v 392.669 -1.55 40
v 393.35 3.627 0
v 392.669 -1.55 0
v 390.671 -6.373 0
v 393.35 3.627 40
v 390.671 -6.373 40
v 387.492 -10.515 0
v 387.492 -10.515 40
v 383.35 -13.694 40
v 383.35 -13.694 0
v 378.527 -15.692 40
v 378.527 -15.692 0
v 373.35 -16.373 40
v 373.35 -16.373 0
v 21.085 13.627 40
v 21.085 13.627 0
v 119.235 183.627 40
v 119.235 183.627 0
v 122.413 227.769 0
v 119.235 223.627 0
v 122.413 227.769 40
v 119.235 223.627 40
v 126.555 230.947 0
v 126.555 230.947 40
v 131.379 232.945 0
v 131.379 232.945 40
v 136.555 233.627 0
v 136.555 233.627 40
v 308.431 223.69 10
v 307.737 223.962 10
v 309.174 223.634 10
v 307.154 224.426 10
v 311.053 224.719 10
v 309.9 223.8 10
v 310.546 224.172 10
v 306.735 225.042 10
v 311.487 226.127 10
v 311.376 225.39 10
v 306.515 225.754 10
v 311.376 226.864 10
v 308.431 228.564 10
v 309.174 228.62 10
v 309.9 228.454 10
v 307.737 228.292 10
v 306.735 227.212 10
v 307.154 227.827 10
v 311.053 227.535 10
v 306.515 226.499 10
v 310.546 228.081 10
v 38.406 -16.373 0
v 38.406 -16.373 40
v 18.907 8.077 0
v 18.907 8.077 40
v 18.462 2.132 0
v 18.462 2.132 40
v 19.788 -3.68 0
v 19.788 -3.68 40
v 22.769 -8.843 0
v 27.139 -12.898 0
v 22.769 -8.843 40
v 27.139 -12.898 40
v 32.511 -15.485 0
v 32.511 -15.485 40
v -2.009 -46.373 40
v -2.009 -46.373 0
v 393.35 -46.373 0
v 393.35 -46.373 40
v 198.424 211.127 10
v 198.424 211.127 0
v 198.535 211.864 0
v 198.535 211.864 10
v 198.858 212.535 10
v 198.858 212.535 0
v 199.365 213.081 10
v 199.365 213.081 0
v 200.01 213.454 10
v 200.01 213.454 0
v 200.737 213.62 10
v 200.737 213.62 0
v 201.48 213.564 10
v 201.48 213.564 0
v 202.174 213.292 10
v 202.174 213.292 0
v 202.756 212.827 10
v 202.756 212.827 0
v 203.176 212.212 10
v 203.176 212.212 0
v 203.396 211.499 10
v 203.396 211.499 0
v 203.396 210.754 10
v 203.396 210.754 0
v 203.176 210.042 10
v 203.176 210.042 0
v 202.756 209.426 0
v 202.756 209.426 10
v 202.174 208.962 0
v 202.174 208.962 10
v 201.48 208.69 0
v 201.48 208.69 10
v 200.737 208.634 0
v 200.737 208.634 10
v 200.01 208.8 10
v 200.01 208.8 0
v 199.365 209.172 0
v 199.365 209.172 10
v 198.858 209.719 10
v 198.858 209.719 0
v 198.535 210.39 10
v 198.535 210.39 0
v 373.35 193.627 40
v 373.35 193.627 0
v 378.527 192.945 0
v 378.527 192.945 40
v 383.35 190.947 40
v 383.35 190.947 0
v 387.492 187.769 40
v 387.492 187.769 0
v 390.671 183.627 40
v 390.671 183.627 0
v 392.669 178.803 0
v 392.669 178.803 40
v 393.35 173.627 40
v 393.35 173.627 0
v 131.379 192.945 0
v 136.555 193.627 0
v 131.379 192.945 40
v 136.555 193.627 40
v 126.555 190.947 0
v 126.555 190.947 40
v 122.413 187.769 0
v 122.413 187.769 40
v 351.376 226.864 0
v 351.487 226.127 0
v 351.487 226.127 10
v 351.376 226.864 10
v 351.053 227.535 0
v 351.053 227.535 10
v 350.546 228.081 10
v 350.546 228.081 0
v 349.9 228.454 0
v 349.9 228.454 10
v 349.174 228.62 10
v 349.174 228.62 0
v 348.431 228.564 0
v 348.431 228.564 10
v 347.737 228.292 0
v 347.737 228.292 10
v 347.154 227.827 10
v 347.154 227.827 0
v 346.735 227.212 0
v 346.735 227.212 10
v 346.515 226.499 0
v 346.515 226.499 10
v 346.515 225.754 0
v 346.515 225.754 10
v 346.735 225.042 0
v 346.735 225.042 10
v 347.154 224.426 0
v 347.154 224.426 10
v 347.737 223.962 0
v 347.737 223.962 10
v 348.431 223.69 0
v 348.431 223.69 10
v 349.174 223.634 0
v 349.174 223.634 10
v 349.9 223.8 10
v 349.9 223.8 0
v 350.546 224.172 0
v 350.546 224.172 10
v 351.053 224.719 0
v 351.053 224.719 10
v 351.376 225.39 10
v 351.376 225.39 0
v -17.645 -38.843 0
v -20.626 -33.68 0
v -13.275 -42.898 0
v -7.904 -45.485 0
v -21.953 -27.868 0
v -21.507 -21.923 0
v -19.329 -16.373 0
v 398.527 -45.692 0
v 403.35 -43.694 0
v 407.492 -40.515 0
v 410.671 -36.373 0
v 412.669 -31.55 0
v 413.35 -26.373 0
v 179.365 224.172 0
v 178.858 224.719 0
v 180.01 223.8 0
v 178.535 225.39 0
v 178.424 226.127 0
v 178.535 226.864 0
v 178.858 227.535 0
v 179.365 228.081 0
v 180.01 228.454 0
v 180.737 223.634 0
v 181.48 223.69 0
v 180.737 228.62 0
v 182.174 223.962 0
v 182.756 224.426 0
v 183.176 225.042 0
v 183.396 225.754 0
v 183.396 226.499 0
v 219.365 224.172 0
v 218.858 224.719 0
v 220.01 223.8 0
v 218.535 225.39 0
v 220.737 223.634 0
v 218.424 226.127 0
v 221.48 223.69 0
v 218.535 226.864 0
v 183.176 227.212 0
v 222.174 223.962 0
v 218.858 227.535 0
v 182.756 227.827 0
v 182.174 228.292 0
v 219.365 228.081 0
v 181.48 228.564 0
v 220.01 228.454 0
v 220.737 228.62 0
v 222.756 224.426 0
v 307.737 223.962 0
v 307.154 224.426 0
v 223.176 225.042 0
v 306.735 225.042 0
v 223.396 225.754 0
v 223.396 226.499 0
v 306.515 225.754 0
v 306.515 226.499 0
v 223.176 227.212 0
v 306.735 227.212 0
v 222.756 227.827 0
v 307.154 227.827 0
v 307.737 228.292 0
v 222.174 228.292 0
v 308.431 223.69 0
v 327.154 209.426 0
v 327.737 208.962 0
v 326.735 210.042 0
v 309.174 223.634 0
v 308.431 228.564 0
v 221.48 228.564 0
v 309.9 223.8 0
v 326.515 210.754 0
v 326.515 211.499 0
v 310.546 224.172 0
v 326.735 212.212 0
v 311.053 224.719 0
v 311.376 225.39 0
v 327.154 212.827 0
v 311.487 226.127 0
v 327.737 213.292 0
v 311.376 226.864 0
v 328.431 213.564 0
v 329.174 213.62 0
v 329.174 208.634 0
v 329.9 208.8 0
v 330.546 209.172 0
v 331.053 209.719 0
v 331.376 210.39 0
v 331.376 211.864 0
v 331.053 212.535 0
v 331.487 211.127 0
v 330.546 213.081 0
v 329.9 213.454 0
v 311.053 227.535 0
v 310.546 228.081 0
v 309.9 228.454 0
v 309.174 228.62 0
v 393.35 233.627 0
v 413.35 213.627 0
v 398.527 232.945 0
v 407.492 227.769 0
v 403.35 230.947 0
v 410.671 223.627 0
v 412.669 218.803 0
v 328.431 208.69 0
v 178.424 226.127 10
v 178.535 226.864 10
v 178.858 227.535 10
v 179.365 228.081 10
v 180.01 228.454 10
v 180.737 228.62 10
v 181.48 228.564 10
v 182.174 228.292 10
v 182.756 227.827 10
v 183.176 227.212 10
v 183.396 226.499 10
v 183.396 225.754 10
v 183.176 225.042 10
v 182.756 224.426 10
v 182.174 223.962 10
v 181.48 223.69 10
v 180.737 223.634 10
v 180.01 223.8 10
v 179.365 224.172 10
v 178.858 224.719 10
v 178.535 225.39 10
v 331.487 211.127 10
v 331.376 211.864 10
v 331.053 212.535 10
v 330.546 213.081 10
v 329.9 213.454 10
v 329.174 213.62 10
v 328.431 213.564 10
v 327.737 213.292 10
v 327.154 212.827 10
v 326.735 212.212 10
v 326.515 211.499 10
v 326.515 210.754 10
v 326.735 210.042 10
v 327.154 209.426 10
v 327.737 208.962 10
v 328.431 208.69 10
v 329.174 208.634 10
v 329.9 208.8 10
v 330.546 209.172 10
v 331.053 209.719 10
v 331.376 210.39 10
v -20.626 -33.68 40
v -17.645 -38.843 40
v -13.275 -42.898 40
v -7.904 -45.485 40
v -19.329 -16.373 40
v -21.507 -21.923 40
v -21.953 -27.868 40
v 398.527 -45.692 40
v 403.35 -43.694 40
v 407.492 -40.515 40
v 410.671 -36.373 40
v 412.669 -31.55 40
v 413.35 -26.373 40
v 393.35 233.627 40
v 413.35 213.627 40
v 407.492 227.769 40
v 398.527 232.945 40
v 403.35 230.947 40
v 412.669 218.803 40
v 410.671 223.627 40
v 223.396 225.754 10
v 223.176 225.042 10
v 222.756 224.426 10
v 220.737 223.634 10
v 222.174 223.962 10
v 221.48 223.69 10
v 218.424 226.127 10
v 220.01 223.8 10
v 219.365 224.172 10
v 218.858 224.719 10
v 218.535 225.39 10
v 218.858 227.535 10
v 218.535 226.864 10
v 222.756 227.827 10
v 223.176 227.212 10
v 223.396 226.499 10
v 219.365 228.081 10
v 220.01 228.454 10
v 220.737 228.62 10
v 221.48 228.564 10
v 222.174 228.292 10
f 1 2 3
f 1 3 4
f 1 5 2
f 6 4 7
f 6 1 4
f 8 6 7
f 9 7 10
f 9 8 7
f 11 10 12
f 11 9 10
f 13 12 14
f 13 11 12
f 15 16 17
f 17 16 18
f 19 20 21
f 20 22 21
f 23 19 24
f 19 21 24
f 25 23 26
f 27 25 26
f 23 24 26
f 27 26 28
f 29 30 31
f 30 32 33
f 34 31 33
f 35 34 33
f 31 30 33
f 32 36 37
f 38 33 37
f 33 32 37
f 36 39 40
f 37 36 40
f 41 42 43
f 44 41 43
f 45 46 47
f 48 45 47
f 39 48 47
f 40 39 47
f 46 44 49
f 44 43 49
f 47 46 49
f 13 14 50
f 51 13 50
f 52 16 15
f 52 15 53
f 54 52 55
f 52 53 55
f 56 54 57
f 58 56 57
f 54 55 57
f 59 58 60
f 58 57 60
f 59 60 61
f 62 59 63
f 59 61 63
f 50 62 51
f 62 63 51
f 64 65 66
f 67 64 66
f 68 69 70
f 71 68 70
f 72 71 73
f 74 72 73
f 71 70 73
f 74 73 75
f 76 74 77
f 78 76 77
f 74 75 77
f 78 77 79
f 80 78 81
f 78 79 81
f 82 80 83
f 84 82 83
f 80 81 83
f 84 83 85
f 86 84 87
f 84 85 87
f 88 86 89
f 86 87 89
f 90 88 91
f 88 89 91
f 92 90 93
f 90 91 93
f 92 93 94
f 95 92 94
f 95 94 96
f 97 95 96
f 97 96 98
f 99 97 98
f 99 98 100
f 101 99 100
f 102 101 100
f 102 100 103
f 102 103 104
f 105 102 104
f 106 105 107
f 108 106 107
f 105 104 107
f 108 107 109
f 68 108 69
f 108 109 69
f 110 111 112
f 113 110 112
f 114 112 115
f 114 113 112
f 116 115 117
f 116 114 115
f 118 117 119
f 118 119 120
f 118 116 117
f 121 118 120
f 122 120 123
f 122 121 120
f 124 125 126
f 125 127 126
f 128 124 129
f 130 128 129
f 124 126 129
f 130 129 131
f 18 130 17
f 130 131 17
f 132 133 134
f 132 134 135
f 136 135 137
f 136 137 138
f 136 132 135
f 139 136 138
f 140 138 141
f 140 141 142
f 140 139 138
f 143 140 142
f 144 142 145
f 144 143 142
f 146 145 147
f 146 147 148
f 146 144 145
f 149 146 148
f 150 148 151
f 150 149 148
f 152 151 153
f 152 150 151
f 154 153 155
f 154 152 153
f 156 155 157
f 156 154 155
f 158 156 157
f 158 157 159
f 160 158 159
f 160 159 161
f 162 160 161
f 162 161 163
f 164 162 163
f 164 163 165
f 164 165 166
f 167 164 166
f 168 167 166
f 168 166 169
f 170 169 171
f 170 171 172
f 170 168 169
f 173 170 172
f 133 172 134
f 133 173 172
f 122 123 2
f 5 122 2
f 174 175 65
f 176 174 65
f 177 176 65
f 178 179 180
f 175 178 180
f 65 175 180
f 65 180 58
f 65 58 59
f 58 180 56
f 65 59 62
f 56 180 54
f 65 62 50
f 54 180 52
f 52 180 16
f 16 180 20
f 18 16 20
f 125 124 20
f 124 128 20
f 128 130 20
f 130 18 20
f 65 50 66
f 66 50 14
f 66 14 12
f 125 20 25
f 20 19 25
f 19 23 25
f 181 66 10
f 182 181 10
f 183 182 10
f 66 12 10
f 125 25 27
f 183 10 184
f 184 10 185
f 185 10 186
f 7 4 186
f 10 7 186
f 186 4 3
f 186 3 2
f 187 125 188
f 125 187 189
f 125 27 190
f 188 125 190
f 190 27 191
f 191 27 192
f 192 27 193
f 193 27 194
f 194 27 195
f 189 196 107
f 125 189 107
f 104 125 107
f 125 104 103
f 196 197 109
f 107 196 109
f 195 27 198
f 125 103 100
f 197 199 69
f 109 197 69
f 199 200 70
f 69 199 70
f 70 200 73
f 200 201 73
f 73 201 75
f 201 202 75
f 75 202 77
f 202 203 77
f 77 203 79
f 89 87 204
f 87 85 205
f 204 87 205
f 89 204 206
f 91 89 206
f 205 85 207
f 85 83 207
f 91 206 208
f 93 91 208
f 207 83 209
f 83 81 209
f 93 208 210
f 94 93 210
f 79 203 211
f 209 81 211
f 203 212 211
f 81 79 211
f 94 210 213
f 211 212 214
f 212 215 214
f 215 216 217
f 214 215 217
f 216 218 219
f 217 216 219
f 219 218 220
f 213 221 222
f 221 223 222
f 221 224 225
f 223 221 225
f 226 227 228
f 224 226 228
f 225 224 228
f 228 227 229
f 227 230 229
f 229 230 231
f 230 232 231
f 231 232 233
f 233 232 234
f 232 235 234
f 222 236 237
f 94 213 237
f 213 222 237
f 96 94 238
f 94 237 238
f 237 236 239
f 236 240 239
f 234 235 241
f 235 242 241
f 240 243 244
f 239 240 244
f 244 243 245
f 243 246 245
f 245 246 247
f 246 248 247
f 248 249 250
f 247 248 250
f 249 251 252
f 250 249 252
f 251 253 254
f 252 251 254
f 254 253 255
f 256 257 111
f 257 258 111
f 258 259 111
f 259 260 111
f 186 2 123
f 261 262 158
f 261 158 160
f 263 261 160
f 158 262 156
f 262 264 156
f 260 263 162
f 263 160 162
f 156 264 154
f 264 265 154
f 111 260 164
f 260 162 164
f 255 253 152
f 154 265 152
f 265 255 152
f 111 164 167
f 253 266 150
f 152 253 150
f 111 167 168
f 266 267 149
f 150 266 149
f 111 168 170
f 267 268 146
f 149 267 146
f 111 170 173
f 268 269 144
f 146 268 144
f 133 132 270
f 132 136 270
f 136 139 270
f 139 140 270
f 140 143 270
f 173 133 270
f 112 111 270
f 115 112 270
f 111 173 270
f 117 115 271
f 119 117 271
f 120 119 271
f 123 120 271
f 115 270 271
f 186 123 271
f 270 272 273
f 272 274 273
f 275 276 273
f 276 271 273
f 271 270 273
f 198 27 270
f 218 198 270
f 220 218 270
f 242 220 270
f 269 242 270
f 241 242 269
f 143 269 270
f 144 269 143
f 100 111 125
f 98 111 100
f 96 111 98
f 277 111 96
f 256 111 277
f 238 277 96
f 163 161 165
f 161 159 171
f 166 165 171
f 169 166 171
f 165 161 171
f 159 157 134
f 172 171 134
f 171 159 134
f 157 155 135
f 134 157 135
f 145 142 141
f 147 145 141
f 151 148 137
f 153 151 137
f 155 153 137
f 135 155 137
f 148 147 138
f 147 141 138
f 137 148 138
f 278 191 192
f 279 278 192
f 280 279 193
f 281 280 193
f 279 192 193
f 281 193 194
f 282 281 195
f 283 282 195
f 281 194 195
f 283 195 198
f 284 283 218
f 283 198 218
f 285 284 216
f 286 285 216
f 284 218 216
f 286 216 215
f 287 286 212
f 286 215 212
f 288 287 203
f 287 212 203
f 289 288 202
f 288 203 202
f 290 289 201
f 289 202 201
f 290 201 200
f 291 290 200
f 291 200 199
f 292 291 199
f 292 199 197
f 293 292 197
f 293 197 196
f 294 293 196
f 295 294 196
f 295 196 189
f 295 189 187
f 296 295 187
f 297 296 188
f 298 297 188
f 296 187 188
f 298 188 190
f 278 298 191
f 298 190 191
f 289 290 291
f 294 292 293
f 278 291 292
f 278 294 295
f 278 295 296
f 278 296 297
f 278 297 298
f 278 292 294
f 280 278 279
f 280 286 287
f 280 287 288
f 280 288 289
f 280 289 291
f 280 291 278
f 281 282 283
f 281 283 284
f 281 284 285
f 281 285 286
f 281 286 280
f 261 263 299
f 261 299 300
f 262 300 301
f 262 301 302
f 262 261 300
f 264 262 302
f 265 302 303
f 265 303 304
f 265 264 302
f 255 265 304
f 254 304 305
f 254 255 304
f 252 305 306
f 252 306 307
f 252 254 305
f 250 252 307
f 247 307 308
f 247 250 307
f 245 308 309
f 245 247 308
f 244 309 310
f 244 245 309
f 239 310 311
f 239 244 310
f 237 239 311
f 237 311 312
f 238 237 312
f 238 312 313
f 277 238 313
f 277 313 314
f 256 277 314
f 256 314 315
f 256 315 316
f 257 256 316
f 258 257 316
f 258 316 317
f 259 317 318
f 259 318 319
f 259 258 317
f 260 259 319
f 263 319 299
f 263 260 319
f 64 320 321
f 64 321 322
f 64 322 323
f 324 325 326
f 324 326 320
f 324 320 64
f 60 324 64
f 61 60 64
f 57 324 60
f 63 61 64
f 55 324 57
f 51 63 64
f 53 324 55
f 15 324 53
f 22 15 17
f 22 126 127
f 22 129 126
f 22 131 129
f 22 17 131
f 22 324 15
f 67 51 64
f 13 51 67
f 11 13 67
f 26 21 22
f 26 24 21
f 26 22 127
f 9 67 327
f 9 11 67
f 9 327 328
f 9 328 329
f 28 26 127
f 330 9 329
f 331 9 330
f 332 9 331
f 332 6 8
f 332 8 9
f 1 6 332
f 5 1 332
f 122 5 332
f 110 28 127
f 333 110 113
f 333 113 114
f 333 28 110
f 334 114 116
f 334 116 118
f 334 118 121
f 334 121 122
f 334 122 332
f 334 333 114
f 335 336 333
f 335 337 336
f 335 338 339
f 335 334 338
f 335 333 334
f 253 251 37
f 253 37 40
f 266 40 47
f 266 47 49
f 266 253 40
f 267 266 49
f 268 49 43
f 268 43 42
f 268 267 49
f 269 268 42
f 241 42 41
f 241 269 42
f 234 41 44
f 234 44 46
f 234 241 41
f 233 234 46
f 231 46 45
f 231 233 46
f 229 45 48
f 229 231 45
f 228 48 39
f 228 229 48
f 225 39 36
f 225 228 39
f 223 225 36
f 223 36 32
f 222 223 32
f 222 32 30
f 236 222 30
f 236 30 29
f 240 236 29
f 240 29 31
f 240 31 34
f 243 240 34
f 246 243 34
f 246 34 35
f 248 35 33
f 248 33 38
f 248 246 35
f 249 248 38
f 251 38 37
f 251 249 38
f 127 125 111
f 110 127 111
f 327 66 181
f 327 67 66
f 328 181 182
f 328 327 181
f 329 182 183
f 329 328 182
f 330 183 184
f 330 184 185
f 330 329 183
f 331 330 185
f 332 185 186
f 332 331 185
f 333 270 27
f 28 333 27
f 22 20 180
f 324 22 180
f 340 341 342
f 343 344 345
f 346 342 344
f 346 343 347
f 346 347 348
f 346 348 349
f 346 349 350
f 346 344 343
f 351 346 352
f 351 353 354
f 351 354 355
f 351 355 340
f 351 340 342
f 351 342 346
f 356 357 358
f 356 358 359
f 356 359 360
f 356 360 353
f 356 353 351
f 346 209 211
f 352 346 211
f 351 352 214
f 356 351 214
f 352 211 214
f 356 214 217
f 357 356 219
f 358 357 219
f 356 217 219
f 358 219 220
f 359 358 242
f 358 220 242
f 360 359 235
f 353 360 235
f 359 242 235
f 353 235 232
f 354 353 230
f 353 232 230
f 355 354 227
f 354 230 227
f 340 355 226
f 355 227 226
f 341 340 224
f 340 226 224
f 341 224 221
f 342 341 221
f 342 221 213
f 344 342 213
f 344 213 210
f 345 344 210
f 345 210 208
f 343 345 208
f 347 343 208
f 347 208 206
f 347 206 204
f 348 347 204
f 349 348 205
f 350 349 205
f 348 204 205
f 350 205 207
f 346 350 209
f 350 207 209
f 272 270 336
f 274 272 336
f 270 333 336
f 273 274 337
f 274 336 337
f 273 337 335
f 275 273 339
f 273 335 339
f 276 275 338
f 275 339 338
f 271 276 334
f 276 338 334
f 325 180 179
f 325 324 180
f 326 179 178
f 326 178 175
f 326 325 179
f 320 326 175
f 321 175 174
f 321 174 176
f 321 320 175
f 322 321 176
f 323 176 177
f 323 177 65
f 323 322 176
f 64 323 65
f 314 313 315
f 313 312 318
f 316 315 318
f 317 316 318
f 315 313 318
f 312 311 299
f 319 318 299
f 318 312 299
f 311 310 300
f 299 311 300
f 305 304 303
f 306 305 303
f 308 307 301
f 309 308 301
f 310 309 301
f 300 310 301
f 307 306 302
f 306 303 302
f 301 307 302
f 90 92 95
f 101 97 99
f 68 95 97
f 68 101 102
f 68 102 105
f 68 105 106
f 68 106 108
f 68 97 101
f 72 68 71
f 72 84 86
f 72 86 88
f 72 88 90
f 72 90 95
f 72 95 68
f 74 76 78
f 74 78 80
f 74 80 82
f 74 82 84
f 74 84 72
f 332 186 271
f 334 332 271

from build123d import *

# Parameters (mm, degrees)
BOSS_EXTRUDE1_DEPTH = 40
SKETCH3_R           = 2.5
CUT_EXTRUDE1_DEPTH  = 10
FILLET3_R           = 20


with BuildPart() as part:
    # Sketch1 → Boss-Extrude1 (new body)
    with BuildSketch(Plane.XY):
        Polygon((125.008360384, 233.626853351), (-36.649714989, -46.373146649), (413.350285011, -46.373146649), (413.350285011, 233.626853351), align=None)
        Polygon((393.350285011, 193.626853351), (393.350285011, -16.373146649), (3.764803854, -16.373146649), (125.008360384, 193.626853351), align=None, mode=Mode.SUBTRACT)
    extrude(amount=BOSS_EXTRUDE1_DEPTH)

    # Sketch3 → Cut-Extrude1 (cut)
    with BuildSketch(Plane(origin=(0, 0, 0), x_dir=(-1, 0, 0), z_dir=(0, 0, -1))):
        with Locations((-180.923528507, 226.126853351)):
            Circle(SKETCH3_R)
        with Locations((-200.923528507, 211.126853351)):
            Circle(SKETCH3_R)
        with Locations((-220.923528507, 226.126853351)):
            Circle(SKETCH3_R)
    cut_extrude1 = extrude(amount=-CUT_EXTRUDE1_DEPTH, mode=Mode.SUBTRACT)

    # Mirror1: Cut-Extrude1 across plane
    add(cut_extrude1.mirror(Plane(origin=(264.955285011, 0, 0), x_dir=(0, 0, 1), z_dir=(1, 0, 0))), mode=Mode.SUBTRACT)

    # Fillet3
    fillet3_edges = [part.edges().sort_by_distance(p)[0] for p in [
        (393.350285011, 193.626853351, 20),
        (125.008360384, 193.626853351, 20),
        (3.764803854, -16.373146649, 20),
        (393.350285011, -16.373146649, 20),
        (-36.649714989, -46.373146649, 20),
        (125.008360384, 233.626853351, 20),
        (413.350285011, 233.626853351, 20),
        (413.350285011, -46.373146649, 20),
    ]]
    fillet(fillet3_edges, radius=FILLET3_R)


solid = part.part
